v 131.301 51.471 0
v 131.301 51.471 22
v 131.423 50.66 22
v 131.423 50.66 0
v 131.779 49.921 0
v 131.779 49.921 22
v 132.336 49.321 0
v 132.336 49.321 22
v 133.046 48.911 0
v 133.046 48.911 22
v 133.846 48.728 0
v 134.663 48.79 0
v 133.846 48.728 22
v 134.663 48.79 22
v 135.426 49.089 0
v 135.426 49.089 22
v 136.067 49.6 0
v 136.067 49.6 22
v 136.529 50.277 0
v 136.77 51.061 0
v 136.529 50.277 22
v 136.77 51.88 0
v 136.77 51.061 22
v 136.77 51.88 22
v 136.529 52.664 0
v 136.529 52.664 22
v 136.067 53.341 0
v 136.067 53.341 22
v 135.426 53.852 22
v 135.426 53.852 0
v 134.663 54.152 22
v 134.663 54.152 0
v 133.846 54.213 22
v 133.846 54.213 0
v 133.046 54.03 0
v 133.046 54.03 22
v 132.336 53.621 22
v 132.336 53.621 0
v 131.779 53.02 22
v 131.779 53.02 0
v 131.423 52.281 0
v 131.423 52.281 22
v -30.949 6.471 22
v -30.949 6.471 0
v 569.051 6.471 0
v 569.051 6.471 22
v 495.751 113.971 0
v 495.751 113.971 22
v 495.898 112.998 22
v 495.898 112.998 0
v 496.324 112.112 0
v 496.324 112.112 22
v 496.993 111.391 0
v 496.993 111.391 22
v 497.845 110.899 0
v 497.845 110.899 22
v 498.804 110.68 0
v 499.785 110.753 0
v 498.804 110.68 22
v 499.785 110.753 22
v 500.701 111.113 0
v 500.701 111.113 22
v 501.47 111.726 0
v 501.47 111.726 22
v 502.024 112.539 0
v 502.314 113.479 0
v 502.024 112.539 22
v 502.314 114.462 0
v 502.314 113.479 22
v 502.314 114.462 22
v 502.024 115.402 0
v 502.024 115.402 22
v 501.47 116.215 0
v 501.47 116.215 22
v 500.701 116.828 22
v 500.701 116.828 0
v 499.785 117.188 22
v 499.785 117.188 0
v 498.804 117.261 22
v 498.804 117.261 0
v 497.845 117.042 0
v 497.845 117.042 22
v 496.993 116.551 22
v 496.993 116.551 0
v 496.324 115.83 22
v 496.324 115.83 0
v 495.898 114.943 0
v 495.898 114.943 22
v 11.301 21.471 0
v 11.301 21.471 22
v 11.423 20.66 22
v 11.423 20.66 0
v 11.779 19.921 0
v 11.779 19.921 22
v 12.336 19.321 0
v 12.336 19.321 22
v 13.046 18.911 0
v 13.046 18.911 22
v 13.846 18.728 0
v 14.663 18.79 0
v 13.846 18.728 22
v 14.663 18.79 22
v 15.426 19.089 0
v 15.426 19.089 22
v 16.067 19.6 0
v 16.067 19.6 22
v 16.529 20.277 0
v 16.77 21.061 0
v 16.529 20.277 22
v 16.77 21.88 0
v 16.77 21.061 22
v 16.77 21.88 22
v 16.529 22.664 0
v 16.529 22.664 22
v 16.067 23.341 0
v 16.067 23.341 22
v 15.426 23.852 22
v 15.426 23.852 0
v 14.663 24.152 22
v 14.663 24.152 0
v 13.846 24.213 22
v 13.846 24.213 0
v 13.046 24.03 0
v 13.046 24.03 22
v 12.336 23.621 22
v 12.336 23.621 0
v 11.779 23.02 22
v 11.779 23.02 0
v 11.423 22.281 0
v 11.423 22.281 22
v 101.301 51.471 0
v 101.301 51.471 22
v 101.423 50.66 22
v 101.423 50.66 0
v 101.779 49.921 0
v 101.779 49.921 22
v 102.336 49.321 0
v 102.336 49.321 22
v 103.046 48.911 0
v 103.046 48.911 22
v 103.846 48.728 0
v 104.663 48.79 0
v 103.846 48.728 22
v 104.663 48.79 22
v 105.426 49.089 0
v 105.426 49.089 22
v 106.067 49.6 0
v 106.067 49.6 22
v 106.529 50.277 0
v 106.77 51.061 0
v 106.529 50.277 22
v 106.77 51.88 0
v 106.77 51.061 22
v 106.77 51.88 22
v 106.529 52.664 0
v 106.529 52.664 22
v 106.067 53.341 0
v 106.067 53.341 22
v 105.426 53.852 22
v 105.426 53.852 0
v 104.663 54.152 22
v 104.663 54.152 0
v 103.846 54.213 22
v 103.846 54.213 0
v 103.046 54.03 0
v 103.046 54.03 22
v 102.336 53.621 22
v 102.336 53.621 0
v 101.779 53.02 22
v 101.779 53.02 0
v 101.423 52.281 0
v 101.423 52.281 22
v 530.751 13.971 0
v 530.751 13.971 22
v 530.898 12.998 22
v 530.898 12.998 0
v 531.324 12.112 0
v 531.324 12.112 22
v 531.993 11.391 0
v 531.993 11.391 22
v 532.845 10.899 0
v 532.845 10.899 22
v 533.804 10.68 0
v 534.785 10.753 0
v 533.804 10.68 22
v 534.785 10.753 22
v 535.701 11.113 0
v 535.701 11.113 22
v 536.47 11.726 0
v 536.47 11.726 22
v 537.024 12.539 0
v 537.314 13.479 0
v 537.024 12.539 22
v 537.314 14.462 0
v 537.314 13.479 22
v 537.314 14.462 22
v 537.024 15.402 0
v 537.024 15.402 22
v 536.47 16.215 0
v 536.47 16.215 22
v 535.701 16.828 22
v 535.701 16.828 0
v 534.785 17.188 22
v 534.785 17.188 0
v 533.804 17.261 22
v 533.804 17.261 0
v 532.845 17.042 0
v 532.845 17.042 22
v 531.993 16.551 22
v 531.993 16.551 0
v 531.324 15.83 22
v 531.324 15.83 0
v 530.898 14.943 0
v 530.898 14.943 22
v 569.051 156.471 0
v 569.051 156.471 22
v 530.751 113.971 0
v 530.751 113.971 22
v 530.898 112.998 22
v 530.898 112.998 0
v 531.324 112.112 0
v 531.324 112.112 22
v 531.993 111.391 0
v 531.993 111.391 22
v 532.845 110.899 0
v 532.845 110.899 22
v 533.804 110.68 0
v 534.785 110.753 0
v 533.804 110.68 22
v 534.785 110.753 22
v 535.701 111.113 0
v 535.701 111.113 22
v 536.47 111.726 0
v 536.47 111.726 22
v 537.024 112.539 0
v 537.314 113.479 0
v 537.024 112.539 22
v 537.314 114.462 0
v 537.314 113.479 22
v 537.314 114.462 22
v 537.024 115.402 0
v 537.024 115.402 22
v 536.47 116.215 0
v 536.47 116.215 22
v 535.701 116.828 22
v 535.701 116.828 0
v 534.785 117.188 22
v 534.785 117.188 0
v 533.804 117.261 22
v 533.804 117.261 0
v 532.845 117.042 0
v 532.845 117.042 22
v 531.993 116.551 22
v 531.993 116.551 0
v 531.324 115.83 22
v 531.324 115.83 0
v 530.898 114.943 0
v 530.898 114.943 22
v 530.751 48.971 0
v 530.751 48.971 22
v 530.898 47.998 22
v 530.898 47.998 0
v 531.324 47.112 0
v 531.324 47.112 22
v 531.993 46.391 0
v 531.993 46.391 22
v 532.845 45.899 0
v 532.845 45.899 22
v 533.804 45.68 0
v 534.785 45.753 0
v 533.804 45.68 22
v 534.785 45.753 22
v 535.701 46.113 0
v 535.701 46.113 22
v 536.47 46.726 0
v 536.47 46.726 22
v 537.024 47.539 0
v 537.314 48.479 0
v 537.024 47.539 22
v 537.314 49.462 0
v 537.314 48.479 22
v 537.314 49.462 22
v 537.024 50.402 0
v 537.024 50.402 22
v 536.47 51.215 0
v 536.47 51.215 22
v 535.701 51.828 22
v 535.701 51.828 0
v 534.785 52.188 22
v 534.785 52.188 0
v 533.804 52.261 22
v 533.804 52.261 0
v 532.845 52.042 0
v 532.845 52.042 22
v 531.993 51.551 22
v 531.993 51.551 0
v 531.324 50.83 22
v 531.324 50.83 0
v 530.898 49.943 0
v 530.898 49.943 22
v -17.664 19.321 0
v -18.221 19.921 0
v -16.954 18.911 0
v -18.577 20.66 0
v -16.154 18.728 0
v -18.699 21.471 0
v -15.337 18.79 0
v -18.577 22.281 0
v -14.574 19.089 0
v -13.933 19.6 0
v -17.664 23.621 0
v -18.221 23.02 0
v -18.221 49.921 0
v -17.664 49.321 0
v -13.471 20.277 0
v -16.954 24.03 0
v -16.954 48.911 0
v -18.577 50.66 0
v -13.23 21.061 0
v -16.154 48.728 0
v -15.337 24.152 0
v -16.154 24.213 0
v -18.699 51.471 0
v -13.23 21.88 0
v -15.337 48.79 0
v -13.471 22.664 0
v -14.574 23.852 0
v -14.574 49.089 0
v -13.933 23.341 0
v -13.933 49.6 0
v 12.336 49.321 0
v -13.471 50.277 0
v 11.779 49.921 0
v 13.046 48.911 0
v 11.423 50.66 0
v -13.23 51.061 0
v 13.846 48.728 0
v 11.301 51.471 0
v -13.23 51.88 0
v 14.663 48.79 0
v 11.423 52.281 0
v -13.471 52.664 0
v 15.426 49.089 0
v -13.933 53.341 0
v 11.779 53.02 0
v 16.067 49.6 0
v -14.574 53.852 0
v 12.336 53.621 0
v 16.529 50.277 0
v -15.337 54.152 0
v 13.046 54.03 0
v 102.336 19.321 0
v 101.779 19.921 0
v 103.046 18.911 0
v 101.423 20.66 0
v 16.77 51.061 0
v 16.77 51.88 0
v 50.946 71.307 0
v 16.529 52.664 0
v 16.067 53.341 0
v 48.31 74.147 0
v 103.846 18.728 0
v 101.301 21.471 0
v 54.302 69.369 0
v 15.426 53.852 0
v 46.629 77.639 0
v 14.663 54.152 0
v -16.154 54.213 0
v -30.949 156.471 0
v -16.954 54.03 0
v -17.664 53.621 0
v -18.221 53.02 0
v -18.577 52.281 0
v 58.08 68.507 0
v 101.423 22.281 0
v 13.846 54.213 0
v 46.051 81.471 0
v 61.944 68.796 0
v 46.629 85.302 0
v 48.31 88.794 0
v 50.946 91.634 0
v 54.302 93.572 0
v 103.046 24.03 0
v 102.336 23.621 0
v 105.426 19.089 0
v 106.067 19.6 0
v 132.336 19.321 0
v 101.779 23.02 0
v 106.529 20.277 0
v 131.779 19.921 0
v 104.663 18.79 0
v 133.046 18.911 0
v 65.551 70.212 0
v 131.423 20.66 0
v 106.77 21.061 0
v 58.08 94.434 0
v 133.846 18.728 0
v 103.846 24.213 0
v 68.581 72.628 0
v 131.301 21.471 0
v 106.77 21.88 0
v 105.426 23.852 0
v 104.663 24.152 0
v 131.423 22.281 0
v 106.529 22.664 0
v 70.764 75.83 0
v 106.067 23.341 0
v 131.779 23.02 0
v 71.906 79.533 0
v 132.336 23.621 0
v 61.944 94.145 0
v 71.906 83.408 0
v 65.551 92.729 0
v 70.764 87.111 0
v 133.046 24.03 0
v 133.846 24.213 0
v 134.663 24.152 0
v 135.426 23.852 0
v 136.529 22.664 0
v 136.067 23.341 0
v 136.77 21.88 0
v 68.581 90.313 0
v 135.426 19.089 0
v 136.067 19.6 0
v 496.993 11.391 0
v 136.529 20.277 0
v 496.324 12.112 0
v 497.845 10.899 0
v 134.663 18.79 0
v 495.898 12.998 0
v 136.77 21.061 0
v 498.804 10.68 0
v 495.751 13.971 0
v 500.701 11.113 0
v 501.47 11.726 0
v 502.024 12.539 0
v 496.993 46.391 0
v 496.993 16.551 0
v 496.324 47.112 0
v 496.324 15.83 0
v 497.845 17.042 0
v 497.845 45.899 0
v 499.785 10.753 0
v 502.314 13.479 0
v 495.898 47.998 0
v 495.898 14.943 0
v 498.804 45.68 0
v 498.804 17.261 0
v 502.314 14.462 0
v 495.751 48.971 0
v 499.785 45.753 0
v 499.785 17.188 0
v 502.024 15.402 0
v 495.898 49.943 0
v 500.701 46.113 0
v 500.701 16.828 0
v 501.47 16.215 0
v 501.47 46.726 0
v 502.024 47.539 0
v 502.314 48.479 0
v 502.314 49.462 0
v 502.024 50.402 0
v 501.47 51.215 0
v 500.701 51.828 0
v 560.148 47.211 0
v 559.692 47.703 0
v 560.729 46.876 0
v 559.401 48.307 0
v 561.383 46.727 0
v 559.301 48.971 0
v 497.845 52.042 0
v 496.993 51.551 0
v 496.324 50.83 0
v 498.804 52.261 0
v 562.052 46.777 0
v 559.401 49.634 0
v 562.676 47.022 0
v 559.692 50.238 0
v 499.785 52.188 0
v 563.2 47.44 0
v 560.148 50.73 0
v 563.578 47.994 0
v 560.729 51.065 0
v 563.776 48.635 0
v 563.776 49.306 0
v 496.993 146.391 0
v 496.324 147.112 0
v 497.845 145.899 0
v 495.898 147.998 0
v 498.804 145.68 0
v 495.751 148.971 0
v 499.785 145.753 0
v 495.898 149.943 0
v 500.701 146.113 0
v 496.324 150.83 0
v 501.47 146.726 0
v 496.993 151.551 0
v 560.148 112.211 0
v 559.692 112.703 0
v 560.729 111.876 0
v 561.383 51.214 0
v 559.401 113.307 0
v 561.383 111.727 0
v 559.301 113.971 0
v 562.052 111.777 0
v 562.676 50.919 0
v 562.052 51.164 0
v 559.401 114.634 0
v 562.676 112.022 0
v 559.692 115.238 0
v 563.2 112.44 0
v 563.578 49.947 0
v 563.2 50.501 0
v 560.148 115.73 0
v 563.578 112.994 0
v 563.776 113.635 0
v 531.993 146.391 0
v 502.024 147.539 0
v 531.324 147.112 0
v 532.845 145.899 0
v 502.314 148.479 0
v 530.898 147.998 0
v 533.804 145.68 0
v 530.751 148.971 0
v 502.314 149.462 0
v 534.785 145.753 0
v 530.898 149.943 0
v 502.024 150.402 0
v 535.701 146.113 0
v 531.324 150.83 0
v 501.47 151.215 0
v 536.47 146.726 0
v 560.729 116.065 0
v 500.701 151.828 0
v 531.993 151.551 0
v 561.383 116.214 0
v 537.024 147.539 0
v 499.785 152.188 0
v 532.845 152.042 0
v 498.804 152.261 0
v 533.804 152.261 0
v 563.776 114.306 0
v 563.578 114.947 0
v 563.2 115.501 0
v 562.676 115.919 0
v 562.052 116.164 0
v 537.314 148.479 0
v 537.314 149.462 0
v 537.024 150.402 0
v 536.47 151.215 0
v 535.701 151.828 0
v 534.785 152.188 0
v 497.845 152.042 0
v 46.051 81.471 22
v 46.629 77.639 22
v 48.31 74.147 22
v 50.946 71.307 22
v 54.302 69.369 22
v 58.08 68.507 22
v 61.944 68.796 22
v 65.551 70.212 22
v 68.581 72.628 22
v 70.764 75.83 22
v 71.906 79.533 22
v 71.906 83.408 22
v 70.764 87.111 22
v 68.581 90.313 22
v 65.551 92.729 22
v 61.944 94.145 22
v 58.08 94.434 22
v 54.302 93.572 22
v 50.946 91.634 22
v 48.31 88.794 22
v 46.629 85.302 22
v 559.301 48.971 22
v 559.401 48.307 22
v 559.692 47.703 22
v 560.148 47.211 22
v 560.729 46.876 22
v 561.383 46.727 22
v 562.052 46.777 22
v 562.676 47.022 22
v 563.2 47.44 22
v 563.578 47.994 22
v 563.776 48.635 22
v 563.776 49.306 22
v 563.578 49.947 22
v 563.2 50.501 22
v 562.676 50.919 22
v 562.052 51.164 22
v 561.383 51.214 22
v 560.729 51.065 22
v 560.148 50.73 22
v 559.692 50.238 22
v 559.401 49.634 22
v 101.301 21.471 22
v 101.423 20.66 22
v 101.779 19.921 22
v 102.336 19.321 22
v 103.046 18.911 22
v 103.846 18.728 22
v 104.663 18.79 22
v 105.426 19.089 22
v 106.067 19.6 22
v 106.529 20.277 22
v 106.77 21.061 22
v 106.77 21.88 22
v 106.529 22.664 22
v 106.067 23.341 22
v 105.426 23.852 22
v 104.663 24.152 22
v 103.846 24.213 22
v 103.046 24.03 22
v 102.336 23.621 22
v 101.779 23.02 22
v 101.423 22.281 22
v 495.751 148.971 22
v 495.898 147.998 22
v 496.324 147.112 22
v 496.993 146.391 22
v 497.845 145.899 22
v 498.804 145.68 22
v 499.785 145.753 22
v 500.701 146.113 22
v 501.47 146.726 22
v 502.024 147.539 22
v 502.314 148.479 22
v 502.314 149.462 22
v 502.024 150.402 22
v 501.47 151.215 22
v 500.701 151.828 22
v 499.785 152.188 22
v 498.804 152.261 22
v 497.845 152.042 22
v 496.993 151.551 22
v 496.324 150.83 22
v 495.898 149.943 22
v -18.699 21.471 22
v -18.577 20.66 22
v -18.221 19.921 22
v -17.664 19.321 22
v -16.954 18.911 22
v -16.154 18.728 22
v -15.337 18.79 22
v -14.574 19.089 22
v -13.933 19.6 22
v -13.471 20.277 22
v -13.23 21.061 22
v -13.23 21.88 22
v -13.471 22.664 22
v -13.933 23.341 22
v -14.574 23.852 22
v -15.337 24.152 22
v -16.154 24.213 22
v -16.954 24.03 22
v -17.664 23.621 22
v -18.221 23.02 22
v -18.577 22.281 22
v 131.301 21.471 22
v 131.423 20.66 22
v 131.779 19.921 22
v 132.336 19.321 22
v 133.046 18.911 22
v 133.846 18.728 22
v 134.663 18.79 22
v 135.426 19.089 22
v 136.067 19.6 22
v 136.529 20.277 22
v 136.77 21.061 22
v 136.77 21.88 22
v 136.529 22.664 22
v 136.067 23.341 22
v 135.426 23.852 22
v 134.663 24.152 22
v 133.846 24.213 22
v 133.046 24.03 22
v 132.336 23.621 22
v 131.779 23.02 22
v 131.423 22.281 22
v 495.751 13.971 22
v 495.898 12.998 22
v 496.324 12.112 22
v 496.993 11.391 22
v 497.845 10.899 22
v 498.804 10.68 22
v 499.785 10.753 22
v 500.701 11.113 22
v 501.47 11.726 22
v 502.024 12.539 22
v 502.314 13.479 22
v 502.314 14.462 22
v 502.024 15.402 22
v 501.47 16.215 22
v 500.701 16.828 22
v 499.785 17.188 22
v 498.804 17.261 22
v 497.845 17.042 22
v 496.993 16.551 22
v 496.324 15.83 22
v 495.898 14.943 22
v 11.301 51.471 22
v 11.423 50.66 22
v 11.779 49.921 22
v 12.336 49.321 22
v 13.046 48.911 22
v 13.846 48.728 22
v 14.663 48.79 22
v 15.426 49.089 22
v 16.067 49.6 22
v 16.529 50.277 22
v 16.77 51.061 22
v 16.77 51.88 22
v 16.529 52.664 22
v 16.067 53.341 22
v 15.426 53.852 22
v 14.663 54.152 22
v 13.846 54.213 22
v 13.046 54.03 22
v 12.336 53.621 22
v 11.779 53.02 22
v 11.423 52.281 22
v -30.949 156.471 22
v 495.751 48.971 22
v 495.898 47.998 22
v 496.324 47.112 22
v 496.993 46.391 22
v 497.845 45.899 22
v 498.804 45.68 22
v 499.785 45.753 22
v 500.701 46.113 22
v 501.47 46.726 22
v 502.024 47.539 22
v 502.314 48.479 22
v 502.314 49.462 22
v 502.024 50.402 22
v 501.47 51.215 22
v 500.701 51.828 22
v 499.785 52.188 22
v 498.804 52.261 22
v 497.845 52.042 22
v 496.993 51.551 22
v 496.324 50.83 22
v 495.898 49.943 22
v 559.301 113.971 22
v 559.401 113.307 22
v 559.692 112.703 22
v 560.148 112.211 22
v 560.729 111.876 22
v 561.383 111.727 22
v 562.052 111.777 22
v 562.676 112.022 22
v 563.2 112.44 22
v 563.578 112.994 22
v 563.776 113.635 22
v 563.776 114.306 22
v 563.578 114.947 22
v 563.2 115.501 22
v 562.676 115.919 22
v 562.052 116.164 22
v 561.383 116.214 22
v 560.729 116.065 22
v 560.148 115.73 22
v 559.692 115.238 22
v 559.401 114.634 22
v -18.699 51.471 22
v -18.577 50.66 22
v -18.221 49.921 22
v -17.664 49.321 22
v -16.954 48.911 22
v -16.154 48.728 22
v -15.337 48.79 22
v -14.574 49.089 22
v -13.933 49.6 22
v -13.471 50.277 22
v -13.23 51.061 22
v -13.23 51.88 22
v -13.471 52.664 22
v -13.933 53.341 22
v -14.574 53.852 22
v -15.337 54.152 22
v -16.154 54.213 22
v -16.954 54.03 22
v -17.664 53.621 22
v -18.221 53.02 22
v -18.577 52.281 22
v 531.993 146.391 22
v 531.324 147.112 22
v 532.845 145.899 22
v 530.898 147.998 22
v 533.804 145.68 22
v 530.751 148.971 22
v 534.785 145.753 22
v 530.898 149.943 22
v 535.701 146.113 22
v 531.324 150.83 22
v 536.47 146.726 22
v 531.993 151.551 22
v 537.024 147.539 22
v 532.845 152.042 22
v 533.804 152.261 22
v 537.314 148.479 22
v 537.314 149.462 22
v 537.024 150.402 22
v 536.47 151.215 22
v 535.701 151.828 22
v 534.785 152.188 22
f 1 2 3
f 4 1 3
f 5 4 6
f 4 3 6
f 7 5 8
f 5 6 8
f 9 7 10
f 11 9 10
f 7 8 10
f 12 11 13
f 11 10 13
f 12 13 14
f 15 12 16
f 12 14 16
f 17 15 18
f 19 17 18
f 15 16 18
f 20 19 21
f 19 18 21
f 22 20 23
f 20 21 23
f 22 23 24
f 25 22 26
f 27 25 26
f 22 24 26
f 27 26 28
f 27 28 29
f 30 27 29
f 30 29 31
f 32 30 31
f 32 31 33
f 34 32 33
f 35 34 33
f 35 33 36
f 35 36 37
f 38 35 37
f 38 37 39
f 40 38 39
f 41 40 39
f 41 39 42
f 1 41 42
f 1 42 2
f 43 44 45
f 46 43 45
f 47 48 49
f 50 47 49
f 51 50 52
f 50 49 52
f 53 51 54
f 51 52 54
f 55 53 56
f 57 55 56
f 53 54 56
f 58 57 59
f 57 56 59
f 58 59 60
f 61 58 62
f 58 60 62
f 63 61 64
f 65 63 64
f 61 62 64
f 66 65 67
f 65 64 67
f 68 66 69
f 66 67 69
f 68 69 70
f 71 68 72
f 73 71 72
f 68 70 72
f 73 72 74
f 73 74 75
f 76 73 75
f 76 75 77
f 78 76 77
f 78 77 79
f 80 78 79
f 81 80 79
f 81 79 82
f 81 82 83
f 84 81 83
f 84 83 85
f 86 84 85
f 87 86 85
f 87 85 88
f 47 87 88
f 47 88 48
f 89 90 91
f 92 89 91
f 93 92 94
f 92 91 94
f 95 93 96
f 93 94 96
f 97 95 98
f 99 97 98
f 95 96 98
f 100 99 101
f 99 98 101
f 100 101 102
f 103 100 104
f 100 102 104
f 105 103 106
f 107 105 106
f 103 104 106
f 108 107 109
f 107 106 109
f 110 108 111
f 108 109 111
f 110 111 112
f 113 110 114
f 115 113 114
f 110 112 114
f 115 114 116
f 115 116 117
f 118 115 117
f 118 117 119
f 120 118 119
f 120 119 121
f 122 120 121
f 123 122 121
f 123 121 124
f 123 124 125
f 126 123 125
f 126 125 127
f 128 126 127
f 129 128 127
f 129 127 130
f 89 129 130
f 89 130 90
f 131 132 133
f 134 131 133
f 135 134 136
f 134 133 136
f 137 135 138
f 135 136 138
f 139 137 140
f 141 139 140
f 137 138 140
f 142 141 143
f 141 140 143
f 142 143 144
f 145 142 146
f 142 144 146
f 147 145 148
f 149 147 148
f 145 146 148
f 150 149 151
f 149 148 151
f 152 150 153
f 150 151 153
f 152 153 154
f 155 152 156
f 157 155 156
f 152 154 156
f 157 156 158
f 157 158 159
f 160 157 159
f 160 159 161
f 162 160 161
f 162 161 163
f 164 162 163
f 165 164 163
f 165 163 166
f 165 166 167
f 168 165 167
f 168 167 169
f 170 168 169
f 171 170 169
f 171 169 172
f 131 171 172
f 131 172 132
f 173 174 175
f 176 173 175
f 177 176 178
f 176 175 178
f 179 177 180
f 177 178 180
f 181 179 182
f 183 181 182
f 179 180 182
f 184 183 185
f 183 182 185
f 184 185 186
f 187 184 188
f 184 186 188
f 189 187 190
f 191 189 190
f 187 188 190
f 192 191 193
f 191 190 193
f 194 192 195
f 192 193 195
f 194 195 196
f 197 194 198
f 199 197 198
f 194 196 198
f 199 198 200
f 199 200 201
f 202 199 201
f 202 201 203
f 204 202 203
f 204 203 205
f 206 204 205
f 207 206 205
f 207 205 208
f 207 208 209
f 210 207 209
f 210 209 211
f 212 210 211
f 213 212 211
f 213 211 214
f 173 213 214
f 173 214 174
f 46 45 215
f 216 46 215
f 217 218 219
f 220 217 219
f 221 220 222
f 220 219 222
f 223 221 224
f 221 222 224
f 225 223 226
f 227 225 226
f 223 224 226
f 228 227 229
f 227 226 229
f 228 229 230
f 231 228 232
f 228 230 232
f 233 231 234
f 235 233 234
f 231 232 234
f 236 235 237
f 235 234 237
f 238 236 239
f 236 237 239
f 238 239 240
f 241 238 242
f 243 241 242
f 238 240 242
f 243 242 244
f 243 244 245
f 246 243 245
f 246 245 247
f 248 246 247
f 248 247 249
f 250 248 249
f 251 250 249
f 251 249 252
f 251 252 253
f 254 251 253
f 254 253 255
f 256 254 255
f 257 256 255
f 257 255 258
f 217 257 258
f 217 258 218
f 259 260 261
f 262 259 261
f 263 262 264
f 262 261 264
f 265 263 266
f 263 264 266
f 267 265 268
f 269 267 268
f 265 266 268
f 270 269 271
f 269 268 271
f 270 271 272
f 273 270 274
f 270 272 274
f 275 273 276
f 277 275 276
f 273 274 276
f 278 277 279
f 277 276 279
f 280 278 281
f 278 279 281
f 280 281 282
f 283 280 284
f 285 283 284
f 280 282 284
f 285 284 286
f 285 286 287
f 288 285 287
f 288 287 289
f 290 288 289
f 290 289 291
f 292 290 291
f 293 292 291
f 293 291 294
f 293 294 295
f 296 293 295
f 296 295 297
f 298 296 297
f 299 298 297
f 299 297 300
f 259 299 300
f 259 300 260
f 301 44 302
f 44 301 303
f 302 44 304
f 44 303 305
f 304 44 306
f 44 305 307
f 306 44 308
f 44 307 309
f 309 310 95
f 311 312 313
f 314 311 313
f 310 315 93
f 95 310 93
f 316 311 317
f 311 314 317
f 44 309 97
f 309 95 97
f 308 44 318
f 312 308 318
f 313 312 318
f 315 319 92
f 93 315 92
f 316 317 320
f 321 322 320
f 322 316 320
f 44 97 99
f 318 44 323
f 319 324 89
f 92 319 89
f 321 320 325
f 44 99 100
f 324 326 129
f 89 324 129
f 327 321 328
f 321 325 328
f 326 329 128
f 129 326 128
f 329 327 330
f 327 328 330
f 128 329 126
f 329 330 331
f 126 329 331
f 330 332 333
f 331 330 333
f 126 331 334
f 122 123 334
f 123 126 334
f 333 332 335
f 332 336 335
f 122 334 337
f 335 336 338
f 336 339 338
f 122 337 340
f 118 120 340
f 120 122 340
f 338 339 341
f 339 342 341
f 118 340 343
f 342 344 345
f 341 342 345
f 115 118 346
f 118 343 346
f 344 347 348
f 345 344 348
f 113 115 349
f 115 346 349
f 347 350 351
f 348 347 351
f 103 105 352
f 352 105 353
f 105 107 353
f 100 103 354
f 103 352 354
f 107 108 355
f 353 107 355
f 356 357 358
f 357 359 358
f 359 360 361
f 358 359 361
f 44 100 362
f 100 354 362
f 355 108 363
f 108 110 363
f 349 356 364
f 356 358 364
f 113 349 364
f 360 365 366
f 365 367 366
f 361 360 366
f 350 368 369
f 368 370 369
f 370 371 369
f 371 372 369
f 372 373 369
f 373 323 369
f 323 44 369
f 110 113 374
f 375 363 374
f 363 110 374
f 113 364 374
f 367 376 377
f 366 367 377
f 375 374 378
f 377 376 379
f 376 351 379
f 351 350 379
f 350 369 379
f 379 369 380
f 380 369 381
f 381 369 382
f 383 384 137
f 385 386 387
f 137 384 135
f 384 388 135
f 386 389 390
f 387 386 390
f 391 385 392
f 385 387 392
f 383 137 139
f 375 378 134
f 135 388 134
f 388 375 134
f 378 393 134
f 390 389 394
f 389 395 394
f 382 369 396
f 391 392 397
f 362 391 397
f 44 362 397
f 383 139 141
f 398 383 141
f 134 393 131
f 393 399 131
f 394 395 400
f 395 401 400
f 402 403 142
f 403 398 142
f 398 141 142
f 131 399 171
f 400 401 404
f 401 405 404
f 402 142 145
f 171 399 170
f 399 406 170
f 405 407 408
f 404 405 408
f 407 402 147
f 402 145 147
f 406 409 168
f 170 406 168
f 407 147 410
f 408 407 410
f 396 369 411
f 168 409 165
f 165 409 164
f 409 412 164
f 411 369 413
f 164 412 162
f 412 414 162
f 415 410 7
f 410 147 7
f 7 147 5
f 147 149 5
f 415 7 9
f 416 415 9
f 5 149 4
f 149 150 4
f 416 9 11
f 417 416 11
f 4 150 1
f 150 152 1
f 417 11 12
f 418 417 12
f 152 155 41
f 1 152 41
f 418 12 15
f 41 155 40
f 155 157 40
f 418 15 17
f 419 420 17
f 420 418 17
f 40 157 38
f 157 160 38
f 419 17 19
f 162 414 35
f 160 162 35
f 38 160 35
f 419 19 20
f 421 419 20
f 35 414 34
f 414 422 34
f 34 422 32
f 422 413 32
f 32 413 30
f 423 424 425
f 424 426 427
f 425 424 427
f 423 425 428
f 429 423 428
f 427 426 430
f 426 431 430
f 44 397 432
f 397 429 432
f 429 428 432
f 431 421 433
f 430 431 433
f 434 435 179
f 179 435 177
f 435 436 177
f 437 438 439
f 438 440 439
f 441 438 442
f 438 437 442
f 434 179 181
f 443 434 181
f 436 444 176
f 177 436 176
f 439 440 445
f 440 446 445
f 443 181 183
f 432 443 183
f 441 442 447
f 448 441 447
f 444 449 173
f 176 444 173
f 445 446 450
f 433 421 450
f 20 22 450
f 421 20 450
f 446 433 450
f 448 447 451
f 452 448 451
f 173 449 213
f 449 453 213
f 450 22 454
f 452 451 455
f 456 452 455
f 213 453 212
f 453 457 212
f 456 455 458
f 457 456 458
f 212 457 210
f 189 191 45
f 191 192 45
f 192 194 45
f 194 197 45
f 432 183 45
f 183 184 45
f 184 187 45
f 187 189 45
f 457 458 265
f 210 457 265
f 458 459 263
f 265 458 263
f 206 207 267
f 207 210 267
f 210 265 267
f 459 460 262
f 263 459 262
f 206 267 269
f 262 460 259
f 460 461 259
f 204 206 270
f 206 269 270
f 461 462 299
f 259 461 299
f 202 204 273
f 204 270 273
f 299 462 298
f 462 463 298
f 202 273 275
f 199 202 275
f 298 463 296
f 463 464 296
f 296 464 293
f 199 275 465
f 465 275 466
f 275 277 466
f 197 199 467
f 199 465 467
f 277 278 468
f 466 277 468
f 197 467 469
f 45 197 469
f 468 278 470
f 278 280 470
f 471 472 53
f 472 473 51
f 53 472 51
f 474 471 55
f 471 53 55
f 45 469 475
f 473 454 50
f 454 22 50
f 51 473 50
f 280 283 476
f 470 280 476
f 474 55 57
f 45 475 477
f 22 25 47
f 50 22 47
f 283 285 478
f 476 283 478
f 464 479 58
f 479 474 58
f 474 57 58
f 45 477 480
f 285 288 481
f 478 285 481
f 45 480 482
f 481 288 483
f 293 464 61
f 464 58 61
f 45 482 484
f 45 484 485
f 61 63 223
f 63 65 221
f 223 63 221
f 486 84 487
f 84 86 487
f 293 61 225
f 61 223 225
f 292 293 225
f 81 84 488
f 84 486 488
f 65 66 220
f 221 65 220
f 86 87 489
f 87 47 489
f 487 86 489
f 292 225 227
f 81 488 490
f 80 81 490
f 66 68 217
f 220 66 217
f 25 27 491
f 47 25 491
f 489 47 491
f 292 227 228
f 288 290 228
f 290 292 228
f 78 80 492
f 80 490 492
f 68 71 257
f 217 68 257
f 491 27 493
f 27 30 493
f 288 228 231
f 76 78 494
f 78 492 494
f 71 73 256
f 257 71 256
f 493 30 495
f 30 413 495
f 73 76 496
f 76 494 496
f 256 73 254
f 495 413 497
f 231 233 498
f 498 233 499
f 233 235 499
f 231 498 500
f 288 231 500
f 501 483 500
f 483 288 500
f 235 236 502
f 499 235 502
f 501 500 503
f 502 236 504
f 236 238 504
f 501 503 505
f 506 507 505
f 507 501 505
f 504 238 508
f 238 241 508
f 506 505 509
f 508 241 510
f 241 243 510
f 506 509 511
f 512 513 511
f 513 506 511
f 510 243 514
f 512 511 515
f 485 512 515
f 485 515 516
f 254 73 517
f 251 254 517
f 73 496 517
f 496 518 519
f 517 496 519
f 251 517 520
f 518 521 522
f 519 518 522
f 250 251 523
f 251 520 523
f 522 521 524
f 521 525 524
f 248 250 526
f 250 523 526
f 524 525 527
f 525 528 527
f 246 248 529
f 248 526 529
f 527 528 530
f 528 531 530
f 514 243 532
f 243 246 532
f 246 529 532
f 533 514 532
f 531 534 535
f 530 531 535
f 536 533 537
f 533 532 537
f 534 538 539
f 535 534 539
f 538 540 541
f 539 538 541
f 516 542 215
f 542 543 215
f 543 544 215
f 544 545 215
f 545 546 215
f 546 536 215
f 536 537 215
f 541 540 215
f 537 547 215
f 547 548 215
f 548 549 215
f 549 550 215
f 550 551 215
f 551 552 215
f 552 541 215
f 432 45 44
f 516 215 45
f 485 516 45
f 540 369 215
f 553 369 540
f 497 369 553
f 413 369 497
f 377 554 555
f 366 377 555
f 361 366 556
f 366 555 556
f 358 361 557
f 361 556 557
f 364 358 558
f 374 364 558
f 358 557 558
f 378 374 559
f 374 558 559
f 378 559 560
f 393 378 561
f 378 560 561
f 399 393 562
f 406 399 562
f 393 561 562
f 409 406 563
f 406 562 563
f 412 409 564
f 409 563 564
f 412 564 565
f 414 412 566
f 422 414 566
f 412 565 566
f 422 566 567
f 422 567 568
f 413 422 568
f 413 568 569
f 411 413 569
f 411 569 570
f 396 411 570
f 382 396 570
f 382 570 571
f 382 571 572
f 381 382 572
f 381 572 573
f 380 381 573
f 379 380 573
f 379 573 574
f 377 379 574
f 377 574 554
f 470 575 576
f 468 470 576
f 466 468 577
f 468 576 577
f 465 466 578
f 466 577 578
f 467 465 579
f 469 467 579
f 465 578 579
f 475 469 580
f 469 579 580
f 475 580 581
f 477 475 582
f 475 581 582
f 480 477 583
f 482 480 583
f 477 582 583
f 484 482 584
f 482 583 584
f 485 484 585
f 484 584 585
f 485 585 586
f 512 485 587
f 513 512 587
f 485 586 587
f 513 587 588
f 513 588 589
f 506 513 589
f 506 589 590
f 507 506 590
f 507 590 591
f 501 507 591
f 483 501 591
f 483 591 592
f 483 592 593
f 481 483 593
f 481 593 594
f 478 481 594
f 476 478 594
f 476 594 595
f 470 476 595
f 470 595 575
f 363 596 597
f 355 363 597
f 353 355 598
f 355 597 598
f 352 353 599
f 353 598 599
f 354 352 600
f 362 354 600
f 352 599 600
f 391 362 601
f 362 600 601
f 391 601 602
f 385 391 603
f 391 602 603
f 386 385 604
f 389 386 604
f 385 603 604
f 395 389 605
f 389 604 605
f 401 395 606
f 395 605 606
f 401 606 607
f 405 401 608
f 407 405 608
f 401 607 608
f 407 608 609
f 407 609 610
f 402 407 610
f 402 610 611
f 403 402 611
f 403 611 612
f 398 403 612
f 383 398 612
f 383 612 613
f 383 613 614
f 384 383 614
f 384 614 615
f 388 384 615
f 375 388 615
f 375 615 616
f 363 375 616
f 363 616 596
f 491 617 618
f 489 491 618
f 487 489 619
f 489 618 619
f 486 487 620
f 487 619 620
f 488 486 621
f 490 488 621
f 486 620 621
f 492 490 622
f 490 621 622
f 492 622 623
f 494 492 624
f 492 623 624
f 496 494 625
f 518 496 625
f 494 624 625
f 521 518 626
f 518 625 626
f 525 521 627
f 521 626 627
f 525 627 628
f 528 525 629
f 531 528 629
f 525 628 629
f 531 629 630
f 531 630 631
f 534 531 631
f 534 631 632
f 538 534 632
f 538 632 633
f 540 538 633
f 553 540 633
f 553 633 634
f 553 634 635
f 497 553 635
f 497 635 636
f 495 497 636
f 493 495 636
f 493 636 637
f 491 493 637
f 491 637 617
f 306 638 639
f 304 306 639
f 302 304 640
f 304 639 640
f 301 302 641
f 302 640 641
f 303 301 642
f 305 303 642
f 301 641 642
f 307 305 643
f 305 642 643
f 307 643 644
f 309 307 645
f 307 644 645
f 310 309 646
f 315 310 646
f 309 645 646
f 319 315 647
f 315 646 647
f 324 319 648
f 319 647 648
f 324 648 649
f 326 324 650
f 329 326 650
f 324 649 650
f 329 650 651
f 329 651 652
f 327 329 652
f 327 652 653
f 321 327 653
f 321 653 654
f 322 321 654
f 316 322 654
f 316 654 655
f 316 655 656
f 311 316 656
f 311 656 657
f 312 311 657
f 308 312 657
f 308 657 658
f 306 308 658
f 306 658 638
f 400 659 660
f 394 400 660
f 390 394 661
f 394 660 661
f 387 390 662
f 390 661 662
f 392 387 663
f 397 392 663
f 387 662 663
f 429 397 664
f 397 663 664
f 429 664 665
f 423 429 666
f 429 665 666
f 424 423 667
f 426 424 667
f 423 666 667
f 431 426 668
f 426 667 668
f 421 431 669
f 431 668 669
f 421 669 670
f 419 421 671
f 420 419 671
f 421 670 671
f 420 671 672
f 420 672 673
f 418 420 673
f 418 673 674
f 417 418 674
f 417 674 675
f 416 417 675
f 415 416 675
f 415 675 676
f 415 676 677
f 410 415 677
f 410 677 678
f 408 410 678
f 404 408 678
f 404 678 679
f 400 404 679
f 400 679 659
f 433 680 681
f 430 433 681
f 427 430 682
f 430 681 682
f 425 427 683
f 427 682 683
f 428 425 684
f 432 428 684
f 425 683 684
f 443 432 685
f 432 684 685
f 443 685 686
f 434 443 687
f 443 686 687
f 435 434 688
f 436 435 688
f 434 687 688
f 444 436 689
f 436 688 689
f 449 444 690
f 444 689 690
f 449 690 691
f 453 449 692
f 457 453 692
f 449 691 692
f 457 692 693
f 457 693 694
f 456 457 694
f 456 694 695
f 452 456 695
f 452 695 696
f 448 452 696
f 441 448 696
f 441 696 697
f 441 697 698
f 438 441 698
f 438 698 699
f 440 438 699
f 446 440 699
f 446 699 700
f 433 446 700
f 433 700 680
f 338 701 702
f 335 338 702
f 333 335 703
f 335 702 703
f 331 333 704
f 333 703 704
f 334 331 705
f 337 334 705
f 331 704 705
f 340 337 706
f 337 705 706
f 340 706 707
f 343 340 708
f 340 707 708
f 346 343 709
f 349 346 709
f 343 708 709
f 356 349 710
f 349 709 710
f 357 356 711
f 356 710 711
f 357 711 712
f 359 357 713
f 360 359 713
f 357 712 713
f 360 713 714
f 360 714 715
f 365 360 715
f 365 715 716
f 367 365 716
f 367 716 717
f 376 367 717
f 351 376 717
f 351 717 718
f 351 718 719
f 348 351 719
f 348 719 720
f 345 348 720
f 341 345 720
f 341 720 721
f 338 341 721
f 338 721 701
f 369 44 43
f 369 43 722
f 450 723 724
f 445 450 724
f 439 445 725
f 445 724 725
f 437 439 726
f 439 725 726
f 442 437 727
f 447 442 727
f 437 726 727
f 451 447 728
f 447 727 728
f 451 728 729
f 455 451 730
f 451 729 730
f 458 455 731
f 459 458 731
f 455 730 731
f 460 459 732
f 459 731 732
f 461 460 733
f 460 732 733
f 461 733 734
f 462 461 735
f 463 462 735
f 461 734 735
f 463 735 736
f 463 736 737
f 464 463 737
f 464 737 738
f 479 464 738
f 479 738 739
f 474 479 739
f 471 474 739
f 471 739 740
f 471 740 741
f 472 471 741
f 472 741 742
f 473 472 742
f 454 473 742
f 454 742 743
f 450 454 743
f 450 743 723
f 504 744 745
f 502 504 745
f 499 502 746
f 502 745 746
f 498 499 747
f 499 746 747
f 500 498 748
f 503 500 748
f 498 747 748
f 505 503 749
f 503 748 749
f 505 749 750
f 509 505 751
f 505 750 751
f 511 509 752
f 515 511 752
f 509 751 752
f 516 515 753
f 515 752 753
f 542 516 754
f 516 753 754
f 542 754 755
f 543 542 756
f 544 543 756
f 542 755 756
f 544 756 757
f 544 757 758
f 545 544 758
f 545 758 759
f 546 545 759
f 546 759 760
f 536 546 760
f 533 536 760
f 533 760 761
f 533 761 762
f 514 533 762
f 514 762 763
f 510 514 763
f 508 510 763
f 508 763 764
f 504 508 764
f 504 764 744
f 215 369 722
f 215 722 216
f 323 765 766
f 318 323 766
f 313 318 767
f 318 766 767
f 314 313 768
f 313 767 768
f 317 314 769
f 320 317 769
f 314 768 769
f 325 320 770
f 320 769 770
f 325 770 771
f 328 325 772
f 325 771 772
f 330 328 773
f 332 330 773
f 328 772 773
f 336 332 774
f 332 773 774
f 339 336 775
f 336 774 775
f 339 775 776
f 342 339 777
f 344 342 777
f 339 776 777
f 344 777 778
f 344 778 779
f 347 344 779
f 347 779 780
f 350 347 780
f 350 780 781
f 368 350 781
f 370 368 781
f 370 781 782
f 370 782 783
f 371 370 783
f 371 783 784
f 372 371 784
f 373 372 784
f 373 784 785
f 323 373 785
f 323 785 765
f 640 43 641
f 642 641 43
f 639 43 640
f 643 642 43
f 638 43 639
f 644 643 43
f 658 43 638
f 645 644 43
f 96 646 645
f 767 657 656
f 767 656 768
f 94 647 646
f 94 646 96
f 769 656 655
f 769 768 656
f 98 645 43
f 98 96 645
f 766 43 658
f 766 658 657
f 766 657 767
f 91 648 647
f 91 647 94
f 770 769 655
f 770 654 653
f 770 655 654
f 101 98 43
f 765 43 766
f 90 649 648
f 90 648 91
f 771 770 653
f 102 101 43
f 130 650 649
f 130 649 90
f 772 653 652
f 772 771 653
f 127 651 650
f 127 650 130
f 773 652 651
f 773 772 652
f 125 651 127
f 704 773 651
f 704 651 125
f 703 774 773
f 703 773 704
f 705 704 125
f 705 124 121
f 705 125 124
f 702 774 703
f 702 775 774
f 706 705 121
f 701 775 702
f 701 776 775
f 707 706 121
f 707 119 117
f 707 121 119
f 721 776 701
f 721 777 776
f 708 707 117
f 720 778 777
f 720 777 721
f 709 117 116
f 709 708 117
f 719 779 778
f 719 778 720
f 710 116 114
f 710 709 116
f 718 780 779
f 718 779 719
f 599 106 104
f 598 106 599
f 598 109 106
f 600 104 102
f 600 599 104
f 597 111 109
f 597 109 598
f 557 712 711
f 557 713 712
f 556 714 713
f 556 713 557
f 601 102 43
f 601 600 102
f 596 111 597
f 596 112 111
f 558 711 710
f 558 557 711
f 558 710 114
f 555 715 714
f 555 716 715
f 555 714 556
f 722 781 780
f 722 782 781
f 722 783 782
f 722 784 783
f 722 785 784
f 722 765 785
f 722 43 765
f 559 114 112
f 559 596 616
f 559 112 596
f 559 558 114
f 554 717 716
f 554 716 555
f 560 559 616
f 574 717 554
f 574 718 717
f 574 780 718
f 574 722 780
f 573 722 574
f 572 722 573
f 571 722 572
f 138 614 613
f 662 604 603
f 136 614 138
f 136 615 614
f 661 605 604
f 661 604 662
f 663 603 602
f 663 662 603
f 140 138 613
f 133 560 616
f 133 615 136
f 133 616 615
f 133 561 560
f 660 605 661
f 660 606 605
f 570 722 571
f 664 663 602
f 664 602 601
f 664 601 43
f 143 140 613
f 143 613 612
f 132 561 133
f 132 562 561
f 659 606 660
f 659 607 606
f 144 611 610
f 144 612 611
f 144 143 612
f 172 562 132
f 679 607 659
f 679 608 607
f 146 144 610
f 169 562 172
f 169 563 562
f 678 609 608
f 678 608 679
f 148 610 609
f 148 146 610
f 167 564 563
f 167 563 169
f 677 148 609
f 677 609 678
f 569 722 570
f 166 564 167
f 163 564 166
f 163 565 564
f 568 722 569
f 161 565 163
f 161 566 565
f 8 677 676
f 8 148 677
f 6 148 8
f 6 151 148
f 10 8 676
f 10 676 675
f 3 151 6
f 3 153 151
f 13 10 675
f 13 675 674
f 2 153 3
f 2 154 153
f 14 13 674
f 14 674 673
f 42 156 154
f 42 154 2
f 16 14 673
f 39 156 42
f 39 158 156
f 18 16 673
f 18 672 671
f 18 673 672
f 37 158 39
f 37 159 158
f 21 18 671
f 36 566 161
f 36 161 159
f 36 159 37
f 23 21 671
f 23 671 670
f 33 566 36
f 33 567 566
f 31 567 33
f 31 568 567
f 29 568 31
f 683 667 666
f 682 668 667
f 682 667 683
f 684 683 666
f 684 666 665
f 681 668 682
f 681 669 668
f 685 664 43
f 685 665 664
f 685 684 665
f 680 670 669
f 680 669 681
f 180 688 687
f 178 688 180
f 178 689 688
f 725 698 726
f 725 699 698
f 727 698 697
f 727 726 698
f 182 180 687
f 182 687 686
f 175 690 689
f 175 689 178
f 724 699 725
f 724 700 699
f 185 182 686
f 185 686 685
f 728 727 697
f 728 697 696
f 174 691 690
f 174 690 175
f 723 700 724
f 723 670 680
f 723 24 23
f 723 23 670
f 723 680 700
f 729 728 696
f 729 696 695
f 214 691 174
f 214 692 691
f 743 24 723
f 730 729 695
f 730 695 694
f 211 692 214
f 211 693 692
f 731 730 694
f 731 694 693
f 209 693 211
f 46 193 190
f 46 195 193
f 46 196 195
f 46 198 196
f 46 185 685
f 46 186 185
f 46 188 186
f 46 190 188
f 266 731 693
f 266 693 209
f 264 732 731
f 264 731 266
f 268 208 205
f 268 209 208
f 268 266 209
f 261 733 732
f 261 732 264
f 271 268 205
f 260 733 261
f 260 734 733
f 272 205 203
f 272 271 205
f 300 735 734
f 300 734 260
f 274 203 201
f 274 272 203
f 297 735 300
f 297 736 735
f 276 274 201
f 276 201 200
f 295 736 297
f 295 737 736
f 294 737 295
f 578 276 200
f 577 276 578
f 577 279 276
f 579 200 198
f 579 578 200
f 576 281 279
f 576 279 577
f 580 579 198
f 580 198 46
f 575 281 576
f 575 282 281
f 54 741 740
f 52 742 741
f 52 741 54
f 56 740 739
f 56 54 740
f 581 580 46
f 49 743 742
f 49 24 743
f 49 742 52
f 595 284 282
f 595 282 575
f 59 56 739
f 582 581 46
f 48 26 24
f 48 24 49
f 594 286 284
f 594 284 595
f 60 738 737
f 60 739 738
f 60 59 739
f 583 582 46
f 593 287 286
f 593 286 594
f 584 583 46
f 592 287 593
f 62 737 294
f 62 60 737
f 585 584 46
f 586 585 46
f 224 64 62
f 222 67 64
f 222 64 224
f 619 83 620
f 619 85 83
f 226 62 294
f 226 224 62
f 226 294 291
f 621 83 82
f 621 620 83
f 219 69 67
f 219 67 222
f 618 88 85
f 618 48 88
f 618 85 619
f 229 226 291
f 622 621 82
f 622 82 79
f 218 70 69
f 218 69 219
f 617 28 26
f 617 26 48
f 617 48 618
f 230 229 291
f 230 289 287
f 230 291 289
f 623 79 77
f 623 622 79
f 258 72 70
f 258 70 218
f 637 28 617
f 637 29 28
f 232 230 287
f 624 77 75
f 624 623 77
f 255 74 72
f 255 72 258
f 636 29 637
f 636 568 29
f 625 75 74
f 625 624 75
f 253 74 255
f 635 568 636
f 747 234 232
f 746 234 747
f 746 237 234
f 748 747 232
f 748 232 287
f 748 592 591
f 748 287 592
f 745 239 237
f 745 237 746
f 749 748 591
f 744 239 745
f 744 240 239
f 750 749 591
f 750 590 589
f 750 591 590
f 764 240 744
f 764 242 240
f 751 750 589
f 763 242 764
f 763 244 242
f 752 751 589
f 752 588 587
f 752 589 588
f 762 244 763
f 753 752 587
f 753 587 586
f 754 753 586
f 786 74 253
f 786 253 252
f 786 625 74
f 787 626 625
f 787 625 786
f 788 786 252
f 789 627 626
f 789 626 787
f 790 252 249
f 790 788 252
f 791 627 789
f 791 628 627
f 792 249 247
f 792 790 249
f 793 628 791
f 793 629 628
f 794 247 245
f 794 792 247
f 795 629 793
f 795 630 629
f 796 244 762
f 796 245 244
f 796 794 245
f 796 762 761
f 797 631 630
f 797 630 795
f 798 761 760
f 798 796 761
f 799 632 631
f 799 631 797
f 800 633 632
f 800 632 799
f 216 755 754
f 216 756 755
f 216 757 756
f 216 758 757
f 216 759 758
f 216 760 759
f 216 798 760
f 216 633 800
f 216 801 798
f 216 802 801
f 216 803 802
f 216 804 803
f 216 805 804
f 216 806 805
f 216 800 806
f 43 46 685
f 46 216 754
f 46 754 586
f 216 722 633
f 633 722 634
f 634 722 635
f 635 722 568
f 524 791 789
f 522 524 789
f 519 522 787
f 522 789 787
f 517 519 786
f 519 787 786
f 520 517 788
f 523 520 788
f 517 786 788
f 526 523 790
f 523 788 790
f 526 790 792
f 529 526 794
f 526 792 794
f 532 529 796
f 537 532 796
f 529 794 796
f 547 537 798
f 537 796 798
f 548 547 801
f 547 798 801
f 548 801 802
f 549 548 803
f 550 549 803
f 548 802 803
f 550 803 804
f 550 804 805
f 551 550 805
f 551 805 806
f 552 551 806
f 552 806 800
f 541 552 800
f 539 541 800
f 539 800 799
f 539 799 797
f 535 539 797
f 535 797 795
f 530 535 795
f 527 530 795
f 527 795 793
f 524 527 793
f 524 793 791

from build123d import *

# Parameters (mm, degrees)
F0_W     = 600
F0_H     = 150
F1_DEPTH = 22
F2_D     = 6.6
F3_D     = 5.5
F4_D     = 26
F5_D     = 4.5


with BuildPart() as f1:
    # F0 (on Top) → F1 (new body)
    with BuildSketch(Plane.XY):
        with Locations((269.0510096401, 81.4705566212)):
            Rectangle(F0_W, F0_H)
    extrude(amount=F1_DEPTH)

    # F2 (through all)
    with Locations(Plane(origin=(0, 0, 0), x_dir=(1, 0, 0), z_dir=(0, 0, -1))):
        with Locations((499.0510096401, -113.9705566212), (534.0510096401, -113.9705566212), (499.0510096401, -148.9705566212), (534.0510096401, -148.9705566212), (534.0510096401, -13.9705566212), (499.0510096401, -48.9705566212), (499.0510096401, -13.9705566212), (534.0510096401, -48.9705566212)):
            Hole(F2_D / 2)

    # F3 (through all)
    with Locations(Plane(origin=(0, 0, 0), x_dir=(1, 0, 0), z_dir=(0, 0, -1))):
        with Locations((-15.9489903599, -21.4705566212), (14.0510096401, -21.4705566212), (104.0510096401, -51.4705566212), (104.0510096401, -21.4705566212), (14.0510096401, -51.4705566212), (134.0510096401, -51.4705566212), (134.0510096401, -21.4705566212), (-15.9489903599, -51.4705566212)):
            Hole(F3_D / 2)

    # F4 (through all)
    with Locations(Plane(origin=(0, 0, 0), x_dir=(1, 0, 0), z_dir=(0, 0, -1))):
        with Locations((59.0510096401, -81.4705566212)):
            Hole(F4_D / 2)

    # F5 (through all)
    with Locations(Plane(origin=(0, 0, 0), x_dir=(1, 0, 0), z_dir=(0, 0, -1))):
        with Locations((561.5510096401, -113.9705566212), (561.5510096401, -48.9705566212)):
            Hole(F5_D / 2)


solid = f1.part
